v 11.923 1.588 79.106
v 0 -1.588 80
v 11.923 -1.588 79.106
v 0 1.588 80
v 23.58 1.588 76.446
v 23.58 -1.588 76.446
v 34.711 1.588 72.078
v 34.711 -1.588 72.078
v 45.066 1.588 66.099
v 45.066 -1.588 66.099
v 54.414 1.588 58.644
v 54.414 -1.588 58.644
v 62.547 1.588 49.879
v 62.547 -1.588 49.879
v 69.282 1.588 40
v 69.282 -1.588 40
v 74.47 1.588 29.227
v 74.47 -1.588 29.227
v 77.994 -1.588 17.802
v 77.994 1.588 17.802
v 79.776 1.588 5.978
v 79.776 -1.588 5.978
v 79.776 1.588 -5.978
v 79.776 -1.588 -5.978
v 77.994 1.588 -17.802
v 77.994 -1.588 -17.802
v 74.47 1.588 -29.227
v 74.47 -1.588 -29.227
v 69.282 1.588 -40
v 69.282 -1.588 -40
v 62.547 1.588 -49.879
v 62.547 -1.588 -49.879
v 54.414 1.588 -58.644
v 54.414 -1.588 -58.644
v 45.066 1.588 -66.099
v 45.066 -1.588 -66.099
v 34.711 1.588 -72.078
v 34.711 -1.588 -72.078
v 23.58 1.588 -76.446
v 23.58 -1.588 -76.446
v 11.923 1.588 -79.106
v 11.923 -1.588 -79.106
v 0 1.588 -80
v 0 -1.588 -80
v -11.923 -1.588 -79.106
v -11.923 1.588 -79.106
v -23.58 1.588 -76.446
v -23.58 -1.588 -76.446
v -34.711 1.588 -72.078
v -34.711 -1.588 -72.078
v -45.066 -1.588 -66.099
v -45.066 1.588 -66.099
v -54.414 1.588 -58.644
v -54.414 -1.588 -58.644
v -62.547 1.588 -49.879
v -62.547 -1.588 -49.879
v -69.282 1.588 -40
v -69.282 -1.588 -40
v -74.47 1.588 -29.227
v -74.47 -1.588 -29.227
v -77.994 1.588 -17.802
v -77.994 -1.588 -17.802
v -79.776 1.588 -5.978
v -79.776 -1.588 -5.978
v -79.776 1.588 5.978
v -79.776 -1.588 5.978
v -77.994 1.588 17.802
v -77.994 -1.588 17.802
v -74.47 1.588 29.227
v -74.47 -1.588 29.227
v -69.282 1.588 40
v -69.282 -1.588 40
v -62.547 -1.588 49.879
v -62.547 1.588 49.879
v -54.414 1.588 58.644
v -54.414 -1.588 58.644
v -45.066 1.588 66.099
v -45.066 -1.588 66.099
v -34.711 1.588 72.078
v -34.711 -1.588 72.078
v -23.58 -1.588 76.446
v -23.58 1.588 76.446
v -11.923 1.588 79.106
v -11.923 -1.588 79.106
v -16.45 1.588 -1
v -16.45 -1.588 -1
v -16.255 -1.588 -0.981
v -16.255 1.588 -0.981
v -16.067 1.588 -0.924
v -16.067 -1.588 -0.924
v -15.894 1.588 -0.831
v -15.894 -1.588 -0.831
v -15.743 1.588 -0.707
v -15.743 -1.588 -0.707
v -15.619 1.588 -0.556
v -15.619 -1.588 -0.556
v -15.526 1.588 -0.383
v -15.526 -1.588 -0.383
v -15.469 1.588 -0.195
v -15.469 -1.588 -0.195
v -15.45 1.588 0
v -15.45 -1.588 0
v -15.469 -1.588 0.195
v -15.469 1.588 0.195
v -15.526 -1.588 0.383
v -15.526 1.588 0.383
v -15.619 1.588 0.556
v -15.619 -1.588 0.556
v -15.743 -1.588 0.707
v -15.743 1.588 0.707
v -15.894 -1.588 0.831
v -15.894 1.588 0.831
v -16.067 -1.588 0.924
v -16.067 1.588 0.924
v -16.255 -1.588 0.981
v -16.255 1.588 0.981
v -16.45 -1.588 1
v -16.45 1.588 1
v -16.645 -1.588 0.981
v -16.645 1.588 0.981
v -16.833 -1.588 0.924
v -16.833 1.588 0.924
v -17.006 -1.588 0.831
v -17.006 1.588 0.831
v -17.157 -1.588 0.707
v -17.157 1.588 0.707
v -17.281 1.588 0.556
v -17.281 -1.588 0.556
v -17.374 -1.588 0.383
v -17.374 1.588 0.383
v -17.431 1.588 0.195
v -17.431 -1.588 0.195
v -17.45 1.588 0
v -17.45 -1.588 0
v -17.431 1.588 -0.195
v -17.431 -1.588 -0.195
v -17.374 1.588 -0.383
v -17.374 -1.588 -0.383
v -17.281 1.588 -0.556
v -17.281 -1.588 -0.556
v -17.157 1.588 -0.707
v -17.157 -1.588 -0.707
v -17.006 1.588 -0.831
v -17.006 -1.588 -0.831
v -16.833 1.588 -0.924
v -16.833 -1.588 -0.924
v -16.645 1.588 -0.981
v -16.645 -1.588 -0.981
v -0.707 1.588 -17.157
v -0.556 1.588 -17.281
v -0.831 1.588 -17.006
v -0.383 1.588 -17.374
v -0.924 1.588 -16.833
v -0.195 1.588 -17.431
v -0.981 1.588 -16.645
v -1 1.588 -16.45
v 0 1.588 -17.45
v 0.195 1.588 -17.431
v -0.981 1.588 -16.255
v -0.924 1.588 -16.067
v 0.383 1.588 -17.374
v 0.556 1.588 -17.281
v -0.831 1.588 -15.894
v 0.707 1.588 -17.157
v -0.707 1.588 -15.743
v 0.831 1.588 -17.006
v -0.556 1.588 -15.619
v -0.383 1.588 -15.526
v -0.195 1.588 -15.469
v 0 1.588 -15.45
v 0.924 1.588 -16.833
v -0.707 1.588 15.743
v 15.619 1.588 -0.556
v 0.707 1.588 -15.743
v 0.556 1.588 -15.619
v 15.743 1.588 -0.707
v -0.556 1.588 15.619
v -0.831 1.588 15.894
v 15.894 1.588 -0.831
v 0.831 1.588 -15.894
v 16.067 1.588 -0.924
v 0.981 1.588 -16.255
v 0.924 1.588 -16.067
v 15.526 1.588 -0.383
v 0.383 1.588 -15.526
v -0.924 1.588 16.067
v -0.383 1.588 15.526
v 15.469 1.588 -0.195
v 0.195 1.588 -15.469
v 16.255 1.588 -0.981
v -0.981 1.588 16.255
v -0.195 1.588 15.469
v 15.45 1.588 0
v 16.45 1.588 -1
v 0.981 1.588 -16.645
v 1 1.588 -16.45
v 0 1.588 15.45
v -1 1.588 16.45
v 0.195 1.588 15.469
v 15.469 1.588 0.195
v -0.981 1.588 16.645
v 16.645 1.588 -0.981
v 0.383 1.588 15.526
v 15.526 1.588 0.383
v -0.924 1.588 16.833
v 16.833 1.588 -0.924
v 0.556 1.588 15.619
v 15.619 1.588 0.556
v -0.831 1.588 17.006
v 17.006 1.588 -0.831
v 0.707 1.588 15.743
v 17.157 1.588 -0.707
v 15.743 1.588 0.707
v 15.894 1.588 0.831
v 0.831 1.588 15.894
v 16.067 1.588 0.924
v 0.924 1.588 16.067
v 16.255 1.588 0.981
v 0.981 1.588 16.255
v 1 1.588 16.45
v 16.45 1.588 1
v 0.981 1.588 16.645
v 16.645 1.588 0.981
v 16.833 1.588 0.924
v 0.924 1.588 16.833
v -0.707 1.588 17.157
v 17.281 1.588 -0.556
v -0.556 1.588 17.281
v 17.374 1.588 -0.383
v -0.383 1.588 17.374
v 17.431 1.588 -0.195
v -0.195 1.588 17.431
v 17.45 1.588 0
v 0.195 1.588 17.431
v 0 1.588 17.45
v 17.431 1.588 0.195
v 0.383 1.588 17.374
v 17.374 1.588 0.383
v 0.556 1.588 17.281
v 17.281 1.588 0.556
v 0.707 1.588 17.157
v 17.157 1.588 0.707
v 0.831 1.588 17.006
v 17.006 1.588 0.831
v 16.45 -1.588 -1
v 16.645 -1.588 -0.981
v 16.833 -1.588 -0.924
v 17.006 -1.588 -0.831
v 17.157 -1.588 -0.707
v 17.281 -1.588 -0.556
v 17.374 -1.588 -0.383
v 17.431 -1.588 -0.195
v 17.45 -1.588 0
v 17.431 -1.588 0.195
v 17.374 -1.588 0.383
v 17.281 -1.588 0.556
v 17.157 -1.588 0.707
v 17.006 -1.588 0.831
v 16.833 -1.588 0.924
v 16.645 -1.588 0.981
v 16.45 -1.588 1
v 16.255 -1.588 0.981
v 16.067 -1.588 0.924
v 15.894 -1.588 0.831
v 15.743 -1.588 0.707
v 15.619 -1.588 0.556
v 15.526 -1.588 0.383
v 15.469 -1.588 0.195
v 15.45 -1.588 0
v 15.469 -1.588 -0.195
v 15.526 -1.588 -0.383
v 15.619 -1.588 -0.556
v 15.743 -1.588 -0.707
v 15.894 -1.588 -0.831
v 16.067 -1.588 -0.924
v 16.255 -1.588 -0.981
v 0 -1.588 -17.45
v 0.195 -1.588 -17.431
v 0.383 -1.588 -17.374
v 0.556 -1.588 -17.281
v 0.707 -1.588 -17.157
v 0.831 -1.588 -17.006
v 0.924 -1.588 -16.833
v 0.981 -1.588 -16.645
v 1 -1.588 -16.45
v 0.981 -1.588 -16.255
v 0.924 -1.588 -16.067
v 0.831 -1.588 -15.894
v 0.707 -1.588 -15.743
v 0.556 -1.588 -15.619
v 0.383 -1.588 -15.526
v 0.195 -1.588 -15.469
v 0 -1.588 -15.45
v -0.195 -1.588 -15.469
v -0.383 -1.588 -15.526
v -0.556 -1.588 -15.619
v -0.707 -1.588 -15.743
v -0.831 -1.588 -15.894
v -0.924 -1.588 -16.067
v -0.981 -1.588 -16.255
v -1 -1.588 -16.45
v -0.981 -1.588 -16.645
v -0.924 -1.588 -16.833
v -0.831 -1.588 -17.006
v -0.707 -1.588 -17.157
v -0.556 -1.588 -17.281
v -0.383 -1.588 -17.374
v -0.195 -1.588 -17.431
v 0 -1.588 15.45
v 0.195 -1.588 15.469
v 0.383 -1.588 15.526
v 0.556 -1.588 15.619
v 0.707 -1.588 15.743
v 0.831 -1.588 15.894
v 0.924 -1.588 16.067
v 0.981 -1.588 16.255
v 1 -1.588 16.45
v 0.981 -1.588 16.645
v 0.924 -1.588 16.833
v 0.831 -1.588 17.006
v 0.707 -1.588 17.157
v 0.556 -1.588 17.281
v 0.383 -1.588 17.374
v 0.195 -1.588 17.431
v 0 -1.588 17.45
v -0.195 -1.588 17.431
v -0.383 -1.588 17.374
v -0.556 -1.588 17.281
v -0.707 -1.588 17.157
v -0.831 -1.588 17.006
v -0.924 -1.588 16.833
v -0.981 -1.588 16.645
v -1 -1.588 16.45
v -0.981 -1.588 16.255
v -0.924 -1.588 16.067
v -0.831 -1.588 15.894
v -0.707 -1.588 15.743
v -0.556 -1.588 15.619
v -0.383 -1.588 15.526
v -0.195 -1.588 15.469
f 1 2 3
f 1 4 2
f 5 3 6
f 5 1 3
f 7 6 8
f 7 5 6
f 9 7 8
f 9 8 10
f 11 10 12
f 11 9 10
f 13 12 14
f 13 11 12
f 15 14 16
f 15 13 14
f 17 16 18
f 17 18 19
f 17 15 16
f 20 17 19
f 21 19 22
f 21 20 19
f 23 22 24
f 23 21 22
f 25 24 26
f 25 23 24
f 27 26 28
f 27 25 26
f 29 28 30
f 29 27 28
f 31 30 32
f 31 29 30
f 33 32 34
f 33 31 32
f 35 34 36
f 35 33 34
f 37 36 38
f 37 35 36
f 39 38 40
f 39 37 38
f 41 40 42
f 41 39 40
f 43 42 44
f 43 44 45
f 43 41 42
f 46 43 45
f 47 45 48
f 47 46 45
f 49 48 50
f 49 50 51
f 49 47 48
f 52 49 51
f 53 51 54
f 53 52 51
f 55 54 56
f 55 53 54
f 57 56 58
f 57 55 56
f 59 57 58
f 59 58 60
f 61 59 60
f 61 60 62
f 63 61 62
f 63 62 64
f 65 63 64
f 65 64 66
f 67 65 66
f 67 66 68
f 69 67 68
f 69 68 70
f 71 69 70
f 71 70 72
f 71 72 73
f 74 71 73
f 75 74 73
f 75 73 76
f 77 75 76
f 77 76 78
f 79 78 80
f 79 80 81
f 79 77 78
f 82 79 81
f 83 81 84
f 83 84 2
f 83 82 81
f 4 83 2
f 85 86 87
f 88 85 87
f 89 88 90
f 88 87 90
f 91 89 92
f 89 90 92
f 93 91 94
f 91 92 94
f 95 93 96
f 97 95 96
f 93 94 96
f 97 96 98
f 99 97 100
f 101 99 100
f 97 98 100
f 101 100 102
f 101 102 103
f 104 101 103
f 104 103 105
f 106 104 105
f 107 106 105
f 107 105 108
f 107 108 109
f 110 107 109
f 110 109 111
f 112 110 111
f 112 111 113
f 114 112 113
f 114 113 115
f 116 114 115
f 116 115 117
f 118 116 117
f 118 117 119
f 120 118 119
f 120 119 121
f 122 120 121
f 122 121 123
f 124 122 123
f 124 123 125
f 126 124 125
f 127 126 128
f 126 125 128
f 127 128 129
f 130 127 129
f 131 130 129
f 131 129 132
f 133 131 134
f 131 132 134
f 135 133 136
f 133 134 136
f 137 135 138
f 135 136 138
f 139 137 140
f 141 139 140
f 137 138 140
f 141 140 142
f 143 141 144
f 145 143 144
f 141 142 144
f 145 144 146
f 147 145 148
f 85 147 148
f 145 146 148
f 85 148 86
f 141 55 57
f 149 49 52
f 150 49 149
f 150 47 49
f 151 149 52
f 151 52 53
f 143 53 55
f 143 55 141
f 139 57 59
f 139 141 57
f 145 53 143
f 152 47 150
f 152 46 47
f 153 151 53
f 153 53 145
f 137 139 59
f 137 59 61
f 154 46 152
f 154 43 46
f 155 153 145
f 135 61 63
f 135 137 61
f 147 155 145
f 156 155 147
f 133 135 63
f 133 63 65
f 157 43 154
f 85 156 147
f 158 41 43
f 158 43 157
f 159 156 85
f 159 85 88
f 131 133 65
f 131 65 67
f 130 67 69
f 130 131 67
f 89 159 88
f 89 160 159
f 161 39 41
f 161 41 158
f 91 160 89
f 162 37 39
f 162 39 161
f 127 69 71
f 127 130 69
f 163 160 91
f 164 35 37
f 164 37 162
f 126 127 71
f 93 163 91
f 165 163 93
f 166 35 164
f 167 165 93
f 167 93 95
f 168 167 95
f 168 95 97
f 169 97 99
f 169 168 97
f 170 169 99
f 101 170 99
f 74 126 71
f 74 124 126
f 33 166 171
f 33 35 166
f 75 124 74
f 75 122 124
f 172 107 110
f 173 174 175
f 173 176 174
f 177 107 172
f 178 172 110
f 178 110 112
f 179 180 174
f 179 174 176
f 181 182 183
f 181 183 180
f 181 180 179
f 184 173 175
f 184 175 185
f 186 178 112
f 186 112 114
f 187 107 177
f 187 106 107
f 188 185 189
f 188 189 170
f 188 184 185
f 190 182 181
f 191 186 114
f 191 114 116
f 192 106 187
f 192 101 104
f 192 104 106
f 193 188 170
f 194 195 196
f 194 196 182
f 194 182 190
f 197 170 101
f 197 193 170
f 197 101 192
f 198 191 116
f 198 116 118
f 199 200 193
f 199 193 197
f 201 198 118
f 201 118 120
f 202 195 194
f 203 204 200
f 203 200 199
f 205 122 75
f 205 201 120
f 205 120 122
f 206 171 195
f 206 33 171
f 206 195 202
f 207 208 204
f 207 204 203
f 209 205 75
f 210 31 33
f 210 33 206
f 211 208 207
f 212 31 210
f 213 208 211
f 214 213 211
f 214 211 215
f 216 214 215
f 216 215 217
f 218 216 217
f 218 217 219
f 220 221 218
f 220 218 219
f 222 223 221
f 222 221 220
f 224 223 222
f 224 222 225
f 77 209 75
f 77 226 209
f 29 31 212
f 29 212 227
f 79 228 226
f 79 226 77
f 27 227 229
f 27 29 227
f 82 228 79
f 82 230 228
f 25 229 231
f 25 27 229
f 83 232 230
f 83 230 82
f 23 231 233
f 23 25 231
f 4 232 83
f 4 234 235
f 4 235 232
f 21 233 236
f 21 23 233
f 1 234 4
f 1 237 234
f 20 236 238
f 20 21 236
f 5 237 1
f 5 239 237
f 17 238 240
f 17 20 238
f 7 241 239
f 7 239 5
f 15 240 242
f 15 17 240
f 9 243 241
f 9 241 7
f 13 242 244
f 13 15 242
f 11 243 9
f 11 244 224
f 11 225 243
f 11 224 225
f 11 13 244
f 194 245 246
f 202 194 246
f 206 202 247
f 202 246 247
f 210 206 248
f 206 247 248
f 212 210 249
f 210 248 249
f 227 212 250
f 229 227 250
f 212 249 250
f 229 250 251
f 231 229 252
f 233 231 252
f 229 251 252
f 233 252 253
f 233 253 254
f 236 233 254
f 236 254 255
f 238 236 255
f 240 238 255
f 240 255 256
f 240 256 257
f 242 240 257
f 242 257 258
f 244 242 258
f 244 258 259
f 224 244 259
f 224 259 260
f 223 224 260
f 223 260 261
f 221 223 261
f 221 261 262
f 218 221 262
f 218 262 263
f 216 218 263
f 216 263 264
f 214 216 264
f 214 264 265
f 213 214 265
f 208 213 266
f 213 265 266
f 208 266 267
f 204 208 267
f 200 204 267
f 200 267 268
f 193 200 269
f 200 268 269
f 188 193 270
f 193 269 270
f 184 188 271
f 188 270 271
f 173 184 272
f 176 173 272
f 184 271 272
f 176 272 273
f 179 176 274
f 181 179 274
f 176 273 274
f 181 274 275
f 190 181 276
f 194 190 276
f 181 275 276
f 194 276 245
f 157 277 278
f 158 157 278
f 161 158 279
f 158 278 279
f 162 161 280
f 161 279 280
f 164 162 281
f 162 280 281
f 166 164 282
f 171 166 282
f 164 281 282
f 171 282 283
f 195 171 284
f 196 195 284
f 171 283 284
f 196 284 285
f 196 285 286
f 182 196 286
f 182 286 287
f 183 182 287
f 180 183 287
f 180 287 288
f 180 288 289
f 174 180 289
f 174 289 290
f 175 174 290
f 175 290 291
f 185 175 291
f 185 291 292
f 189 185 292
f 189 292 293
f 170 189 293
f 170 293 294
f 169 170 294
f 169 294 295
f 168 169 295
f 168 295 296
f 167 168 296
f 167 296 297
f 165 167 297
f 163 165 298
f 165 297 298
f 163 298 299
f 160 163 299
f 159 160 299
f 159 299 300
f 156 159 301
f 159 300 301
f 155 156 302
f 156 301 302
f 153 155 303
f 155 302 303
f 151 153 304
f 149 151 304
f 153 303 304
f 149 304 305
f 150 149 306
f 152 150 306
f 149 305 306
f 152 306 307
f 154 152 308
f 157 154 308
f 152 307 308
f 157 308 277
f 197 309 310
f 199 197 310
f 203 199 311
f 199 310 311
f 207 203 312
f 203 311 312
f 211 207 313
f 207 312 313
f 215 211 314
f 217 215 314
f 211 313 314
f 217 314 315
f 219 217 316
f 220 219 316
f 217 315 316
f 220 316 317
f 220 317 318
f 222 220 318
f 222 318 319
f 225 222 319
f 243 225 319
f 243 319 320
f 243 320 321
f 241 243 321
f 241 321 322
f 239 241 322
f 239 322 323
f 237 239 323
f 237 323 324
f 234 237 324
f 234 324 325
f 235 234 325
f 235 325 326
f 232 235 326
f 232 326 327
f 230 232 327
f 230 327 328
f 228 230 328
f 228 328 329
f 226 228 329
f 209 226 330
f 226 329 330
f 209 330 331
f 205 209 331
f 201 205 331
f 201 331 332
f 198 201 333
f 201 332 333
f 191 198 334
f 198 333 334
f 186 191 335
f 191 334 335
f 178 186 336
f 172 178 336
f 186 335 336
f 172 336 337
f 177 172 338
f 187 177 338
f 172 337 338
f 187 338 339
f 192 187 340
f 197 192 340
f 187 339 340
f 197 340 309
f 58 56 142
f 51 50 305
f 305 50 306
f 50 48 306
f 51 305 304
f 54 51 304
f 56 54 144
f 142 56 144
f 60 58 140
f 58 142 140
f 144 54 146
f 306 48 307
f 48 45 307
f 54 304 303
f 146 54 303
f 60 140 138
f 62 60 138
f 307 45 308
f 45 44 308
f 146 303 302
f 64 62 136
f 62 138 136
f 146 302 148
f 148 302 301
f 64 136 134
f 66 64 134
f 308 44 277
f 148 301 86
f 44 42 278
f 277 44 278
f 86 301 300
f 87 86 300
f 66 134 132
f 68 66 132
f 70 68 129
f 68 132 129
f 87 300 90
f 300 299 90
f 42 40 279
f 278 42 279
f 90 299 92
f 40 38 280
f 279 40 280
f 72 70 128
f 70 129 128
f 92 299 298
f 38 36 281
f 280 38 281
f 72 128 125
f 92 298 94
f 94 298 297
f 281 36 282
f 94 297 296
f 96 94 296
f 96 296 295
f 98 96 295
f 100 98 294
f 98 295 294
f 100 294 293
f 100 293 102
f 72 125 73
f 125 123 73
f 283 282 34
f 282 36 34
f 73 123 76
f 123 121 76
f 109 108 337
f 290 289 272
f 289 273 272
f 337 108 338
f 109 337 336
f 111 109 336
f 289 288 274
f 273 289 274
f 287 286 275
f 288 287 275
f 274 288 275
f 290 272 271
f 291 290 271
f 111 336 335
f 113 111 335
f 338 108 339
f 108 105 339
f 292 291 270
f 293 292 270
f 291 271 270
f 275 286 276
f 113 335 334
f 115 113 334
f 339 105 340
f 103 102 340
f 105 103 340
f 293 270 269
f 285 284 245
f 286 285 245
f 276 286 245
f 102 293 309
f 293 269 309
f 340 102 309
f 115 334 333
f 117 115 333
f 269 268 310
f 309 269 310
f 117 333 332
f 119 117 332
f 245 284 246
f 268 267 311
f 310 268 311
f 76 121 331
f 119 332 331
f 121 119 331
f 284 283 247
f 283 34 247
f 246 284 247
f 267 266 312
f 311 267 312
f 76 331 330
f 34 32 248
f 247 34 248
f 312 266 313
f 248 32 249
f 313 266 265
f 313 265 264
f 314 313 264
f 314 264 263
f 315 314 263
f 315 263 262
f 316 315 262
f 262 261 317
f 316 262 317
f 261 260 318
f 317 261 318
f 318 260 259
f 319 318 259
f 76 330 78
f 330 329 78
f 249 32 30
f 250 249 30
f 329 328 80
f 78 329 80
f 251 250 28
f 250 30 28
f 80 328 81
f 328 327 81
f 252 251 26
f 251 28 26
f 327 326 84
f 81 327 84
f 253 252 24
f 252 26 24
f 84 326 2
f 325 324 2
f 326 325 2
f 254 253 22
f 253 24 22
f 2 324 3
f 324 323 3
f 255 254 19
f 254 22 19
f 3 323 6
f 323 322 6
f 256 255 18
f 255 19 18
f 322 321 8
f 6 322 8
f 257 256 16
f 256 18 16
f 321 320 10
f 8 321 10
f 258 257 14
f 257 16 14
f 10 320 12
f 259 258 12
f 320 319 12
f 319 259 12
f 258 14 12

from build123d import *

# Parameters (mm, degrees)
SKETCH1_R           = 80
BOSS_EXTRUDE1_DEPTH = 1.5875
SKETCH2_R           = 1
SKETCH2_R_2         = 0.85
CUT_EXTRUDE2_DEPTH  = 114.181626711


with BuildPart() as part:
    # Sketch1 → Boss-Extrude1 (new, symmetric)
    with BuildSketch(Plane(origin=(0, 0, 0), x_dir=(1, 0, 0), z_dir=(0, 1, 0))):
        with Locations(Location((0, 0, 0), (0, 0, 270))):
            Circle(SKETCH1_R)
    extrude(amount=BOSS_EXTRUDE1_DEPTH, both=True)

    # Sketch2 → Cut-Extrude2 (cut, through all)
    # profile 1 of 8: a face of its own
    with BuildSketch(Plane.XZ.offset(1.5875)):
        with Locations(Location((16.45, 0, 0), (0, 0, 270))):
            Circle(SKETCH2_R)
        with Locations((16.45, 0)):
            Circle(SKETCH2_R_2, mode=Mode.SUBTRACT)
    # profile 2 of 8: a face of its own
    with BuildSketch(Plane.XZ.offset(1.5875)):
        with Locations((16.45, 0)):
            Circle(SKETCH2_R_2)
    # profile 3 of 8: a face of its own
    with BuildSketch(Plane.XZ.offset(1.5875)):
        with Locations(Location((0, -16.45, 0), (0, 0, 270))):
            Circle(SKETCH2_R)
        with Locations((0, -16.45)):
            Circle(SKETCH2_R_2, mode=Mode.SUBTRACT)
    # profile 4 of 8: a face of its own
    with BuildSketch(Plane.XZ.offset(1.5875)):
        with Locations((0, -16.45)):
            Circle(SKETCH2_R_2)
    # profile 5 of 8: a face of its own
    with BuildSketch(Plane.XZ.offset(1.5875)):
        with Locations(Location((-16.45, 0, 0), (0, 0, 270))):
            Circle(SKETCH2_R)
        with Locations((-16.45, 0)):
            Circle(SKETCH2_R_2, mode=Mode.SUBTRACT)
    # profile 6 of 8: a face of its own
    with BuildSketch(Plane.XZ.offset(1.5875)):
        with Locations((-16.45, 0)):
            Circle(SKETCH2_R_2)
    # profile 7 of 8: a face of its own
    with BuildSketch(Plane.XZ.offset(1.5875)):
        with Locations(Location((0, 16.45, 0), (0, 0, 270))):
            Circle(SKETCH2_R)
        with Locations((0, 16.45)):
            Circle(SKETCH2_R_2, mode=Mode.SUBTRACT)
    # profile 8 of 8: a face of its own
    with BuildSketch(Plane.XZ.offset(1.5875)):
        with Locations((0, 16.45)):
            Circle(SKETCH2_R_2)
    extrude(amount=-CUT_EXTRUDE2_DEPTH, mode=Mode.SUBTRACT)


solid = part.part
